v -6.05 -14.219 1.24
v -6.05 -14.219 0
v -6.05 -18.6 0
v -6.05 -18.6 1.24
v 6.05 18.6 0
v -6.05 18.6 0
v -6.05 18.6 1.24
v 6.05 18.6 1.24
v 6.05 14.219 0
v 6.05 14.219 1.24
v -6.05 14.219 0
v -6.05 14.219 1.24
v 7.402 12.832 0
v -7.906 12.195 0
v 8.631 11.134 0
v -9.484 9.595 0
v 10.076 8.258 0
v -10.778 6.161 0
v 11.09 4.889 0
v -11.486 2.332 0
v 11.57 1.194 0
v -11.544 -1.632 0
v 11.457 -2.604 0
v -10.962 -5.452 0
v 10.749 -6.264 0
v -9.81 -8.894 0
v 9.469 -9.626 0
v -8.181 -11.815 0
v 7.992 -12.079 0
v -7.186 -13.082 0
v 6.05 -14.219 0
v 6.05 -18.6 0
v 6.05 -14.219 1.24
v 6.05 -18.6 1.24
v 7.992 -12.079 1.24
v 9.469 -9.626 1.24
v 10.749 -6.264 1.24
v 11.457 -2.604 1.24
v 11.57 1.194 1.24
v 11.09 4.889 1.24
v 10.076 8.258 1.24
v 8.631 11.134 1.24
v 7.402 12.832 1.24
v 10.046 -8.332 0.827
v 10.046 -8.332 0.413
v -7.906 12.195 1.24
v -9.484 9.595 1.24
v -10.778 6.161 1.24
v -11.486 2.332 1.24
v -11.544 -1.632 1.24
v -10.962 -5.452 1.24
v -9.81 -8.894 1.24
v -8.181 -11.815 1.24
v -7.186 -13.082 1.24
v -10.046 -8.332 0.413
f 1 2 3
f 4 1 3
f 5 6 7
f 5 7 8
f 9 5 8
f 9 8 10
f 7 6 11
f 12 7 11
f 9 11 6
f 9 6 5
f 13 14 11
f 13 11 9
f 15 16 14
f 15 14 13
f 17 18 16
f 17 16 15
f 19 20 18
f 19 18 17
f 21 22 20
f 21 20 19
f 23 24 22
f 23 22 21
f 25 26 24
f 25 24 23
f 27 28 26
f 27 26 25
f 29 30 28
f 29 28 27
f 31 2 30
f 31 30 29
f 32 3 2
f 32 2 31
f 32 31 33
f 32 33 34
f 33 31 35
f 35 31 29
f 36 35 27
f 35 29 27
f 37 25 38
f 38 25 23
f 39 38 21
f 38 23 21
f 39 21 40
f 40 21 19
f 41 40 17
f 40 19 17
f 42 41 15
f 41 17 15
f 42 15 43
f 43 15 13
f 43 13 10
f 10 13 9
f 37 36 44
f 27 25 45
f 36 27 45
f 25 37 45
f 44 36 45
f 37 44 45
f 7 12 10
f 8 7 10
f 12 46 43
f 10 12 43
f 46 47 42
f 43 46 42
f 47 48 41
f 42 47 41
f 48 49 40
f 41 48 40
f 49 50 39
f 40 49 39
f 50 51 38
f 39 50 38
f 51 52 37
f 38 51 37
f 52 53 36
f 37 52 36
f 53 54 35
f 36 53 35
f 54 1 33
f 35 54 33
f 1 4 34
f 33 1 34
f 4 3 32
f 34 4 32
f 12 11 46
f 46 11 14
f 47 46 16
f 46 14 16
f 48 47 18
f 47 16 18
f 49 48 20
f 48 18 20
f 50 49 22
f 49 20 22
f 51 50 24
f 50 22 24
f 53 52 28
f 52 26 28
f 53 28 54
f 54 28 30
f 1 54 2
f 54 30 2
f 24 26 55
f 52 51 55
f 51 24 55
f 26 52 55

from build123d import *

# Parameters (mm, degrees)
PAD_DEPTH    = 1.24
SKETCH001_W  = 12.1
SKETCH001_H  = 37.2
PAD001_DEPTH = 1.24


with BuildPart() as part:
    # Sketch → Pad (new body)
    with BuildSketch(Plane.XY):
        with BuildLine():
            add(Edge.make_bspline(
                [(0, 16.665), (-20.091789, 16.665), (-10.045895, -8.3325), (0, -33.33), (10.045895, -8.3325), (20.091789, 16.665), (0, 16.665)],
                knots=[0, 0, 0, 2.094395, 2.094395, 4.18879, 4.18879, 6.283185, 6.283185, 6.283185], degree=2, weights=[1, 0.5, 1, 0.5, 1, 0.5, 1]))
        make_face()
    extrude(amount=PAD_DEPTH)

    # Sketch001 (on Face2 of Pad) → Pad001 (join)
    with BuildSketch(Plane(origin=(0, 0, 0), x_dir=(1, 0, 0), z_dir=(0, 0, -1))):
        Rectangle(SKETCH001_W, SKETCH001_H)
    extrude(amount=-PAD001_DEPTH)


solid = part.part
